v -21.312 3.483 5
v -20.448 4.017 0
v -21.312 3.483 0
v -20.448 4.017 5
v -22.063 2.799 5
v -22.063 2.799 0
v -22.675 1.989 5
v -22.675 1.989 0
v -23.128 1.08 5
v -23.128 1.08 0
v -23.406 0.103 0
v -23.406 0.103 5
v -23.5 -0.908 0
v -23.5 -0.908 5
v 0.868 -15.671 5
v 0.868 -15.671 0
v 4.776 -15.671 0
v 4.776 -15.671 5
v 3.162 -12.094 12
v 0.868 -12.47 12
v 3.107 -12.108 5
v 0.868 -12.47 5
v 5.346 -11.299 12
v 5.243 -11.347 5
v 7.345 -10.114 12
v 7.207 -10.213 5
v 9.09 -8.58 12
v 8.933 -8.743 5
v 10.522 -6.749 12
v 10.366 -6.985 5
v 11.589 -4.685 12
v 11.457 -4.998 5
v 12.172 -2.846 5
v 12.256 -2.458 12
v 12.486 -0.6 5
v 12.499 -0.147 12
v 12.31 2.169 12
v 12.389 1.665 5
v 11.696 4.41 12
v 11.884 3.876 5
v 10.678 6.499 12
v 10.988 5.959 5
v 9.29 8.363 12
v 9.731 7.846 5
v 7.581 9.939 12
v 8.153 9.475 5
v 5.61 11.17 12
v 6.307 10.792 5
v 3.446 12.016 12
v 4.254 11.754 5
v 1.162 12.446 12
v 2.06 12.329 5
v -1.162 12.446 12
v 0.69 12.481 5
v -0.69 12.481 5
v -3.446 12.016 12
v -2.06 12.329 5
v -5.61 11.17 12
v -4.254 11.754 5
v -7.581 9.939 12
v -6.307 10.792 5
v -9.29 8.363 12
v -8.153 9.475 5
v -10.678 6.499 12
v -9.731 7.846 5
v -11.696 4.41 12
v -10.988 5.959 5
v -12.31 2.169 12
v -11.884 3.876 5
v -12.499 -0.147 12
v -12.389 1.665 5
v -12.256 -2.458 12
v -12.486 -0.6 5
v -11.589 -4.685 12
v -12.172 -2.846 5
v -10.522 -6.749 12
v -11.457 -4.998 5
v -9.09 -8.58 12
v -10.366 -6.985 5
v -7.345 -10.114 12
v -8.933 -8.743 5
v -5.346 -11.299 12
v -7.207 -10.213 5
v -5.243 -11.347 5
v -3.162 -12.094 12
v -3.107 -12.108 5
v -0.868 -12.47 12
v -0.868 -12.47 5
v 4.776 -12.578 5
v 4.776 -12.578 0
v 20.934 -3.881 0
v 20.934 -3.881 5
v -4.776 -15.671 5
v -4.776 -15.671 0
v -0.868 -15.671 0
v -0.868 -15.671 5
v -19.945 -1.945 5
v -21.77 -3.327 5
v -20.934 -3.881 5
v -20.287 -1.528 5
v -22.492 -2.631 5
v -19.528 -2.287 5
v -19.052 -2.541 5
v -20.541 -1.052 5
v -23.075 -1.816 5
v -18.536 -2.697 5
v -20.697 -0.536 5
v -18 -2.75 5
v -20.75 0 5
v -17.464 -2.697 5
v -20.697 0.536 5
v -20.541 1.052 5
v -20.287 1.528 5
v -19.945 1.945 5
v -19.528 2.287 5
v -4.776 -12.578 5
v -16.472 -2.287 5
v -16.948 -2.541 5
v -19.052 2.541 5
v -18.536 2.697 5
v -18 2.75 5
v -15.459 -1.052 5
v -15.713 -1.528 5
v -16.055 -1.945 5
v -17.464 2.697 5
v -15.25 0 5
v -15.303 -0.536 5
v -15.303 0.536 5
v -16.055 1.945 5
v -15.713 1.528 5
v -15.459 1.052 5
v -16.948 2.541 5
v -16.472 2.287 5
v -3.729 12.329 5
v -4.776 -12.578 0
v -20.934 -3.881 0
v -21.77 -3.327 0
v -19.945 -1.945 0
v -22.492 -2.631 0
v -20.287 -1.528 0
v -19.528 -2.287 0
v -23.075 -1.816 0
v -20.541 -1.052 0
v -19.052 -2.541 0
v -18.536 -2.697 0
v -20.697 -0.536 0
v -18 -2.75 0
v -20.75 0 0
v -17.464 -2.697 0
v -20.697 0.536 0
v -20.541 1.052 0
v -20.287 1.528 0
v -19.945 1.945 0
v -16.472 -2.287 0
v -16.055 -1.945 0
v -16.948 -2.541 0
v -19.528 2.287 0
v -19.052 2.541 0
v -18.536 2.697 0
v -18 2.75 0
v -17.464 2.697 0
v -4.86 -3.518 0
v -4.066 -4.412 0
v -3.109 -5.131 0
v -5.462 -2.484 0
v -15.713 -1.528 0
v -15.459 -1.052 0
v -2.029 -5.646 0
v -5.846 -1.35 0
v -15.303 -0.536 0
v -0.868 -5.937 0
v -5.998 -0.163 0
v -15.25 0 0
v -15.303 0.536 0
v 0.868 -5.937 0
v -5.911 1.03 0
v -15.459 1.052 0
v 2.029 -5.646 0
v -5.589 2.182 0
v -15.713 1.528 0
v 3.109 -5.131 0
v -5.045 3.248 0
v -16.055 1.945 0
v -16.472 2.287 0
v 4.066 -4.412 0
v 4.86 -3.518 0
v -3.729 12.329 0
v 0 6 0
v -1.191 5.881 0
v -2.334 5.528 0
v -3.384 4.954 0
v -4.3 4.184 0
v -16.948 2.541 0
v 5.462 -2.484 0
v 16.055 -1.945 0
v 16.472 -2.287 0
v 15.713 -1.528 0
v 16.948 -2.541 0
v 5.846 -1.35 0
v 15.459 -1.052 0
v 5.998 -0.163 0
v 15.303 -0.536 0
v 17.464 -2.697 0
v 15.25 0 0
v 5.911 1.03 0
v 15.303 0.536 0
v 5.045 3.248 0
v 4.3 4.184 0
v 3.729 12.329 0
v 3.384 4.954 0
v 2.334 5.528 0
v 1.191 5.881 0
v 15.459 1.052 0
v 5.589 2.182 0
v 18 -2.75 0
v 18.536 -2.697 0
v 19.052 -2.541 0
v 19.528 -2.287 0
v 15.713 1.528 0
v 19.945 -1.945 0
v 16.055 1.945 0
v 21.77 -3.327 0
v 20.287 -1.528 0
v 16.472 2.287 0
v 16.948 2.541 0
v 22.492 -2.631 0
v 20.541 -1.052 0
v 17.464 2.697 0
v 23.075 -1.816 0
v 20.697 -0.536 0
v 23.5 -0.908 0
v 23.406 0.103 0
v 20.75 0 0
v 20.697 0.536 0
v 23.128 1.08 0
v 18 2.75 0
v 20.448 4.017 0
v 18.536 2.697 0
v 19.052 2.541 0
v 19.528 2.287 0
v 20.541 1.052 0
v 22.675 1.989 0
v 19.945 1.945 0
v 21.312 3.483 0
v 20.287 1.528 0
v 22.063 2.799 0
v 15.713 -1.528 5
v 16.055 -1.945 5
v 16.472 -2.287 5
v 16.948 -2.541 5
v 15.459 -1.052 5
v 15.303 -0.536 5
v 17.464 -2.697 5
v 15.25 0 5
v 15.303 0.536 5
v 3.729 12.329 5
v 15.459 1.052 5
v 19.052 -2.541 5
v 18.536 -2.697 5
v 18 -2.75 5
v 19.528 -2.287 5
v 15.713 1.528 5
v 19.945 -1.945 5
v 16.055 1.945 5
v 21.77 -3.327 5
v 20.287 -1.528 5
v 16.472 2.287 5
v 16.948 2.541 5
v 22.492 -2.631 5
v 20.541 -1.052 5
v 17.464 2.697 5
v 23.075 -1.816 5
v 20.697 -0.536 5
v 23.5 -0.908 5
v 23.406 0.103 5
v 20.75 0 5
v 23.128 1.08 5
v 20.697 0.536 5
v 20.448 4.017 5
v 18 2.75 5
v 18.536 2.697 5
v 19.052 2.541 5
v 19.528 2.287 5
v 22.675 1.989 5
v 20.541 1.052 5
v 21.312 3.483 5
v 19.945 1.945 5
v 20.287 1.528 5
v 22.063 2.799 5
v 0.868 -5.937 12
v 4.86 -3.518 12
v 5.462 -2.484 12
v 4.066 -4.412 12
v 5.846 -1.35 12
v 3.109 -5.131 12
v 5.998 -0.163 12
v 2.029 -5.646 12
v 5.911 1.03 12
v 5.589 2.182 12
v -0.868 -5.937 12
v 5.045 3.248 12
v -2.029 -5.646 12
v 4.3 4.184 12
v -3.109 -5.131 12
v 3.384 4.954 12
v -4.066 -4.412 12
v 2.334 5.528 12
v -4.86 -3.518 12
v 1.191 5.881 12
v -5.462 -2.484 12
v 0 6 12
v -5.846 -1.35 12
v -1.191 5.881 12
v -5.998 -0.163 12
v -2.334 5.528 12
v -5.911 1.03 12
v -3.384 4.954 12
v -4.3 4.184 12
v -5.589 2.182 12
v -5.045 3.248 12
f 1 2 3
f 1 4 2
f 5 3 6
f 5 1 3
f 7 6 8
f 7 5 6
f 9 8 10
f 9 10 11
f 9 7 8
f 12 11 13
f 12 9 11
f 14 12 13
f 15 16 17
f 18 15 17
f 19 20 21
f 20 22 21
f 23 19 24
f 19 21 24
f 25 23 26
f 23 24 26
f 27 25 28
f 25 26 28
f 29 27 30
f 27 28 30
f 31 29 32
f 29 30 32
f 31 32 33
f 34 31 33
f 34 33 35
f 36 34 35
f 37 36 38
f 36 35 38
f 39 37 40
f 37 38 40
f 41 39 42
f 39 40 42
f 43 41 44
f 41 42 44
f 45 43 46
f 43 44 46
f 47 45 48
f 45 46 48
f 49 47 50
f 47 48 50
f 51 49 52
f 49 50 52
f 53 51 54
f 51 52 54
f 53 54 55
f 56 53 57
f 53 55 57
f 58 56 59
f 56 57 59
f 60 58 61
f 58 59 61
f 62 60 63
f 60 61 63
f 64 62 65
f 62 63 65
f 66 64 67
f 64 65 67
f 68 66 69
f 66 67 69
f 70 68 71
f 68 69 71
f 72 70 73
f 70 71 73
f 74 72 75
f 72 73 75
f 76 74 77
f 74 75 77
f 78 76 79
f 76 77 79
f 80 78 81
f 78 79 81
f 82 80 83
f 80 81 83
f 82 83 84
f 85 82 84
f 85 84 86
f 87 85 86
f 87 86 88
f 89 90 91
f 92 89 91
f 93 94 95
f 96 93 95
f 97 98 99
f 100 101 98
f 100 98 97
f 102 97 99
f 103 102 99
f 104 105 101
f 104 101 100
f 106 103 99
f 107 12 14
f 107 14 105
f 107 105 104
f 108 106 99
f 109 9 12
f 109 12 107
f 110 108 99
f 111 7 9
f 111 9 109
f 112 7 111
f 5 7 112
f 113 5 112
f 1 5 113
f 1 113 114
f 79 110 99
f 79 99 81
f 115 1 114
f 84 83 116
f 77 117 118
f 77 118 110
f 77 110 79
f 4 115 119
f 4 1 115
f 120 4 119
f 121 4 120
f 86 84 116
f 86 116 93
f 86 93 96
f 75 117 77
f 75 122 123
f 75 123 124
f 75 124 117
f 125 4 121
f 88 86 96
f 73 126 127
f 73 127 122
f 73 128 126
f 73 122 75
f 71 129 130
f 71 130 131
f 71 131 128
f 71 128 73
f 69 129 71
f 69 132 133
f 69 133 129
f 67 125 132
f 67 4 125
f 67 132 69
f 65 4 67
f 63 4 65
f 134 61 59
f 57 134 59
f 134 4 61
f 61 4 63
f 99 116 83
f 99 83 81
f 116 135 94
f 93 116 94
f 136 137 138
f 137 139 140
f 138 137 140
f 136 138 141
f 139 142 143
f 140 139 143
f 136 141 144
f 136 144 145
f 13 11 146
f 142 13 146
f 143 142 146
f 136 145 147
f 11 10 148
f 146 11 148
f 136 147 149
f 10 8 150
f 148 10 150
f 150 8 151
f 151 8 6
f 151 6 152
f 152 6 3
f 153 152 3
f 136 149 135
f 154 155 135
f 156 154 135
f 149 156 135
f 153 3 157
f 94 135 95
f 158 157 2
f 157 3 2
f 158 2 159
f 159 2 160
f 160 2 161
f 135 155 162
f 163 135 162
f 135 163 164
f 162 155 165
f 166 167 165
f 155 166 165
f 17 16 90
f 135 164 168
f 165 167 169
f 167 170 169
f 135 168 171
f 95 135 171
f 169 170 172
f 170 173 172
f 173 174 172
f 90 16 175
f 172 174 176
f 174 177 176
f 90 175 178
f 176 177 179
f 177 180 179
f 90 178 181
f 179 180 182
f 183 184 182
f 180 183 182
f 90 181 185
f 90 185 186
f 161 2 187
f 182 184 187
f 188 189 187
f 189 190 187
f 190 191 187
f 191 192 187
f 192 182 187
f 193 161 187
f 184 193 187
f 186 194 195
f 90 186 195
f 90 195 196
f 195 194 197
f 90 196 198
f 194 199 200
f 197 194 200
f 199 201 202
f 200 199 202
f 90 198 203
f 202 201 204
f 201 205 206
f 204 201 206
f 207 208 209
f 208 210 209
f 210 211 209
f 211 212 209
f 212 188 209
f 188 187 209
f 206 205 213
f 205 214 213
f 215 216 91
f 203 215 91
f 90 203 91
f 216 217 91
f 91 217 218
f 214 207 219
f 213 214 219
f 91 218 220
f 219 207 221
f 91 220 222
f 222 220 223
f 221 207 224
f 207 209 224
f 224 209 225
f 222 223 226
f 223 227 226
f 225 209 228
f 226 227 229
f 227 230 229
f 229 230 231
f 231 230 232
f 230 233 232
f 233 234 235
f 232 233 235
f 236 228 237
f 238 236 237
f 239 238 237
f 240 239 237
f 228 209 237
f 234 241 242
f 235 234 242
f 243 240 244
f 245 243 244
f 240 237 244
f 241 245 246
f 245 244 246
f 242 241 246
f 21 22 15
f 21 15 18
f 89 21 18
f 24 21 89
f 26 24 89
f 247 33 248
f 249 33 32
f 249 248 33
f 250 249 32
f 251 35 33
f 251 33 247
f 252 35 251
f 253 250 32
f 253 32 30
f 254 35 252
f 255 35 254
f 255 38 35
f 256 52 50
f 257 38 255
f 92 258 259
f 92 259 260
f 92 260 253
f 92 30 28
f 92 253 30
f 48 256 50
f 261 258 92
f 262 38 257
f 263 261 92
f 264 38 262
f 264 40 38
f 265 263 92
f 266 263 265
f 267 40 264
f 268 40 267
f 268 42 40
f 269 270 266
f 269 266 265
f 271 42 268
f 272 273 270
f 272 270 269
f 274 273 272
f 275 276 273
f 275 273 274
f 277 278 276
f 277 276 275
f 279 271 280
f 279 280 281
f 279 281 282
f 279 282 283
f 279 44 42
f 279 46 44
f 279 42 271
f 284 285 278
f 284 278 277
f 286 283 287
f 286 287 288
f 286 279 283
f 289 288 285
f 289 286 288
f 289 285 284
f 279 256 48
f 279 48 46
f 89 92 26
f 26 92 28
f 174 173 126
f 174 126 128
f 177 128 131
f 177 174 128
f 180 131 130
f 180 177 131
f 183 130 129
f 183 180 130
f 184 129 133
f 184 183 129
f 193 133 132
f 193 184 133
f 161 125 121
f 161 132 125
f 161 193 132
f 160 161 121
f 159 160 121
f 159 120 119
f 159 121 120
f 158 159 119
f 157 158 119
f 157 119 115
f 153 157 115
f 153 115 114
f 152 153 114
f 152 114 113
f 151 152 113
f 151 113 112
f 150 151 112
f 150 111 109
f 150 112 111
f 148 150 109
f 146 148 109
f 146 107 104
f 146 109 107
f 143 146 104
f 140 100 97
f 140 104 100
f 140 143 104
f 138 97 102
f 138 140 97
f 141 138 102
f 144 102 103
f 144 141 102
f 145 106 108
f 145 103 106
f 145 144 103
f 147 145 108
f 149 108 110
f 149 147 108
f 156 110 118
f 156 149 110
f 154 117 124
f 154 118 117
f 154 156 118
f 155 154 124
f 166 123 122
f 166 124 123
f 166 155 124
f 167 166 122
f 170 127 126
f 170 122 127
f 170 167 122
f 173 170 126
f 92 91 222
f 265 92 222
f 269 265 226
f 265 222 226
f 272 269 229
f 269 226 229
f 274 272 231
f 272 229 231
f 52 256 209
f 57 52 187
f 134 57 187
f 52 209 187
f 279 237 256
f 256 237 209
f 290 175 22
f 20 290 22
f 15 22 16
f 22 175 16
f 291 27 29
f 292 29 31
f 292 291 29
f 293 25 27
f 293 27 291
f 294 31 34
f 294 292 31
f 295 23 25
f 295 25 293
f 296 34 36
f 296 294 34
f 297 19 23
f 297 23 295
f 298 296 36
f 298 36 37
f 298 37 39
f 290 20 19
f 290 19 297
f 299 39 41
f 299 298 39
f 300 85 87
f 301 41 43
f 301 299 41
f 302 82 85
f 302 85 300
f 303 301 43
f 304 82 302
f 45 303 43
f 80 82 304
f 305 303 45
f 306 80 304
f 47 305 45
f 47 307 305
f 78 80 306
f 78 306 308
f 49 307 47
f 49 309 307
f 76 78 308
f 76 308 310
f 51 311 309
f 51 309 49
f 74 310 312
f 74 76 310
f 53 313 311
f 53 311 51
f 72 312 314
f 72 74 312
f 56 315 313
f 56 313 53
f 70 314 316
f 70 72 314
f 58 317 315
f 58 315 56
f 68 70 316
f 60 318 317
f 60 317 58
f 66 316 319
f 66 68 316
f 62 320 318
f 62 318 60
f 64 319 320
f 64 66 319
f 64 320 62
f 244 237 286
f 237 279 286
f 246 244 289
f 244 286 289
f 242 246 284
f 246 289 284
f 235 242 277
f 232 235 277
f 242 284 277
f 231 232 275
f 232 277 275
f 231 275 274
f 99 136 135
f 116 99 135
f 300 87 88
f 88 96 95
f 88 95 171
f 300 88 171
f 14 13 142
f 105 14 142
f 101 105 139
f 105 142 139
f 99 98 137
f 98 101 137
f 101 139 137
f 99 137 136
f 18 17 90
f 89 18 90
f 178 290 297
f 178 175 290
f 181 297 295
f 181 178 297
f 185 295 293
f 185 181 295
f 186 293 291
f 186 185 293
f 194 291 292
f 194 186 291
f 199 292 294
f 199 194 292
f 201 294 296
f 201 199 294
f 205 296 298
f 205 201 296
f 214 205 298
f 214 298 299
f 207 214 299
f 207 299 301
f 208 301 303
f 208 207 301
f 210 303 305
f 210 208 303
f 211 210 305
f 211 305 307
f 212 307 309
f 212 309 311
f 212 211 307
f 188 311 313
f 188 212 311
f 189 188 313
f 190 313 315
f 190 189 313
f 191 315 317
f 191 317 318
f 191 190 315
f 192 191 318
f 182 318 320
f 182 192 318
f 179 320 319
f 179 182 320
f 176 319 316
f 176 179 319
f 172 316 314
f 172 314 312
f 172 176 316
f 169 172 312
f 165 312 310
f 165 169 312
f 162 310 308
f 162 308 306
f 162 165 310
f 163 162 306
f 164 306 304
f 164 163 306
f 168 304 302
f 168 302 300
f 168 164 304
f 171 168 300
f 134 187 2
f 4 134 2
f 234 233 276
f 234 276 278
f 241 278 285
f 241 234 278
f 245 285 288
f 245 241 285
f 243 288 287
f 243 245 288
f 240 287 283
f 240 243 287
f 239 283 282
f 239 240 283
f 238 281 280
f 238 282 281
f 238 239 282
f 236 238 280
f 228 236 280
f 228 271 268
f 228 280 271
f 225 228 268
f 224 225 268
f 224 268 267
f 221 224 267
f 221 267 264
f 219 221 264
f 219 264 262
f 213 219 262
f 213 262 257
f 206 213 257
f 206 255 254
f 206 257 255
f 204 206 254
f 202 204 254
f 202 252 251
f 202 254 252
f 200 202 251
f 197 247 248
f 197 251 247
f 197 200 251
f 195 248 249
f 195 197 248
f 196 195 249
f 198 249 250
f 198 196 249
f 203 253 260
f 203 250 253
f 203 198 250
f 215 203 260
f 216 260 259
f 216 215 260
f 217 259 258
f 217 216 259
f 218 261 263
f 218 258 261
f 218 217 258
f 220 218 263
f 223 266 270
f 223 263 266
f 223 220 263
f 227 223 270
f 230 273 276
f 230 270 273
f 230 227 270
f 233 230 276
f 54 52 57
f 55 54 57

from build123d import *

# Parameters (mm, degrees)
RESSALTO_EXTRUS_O1_DEPTH   = 5
ESBO_O3_R                  = 12.5
RESSALTO_EXTRUS_O2_DEPTH   = 7
CORTE_EXTRUS_O1_DEPTH      = 30.100324457
CORTE_EXTRUS_O1_DEPTH_BACK = 30.100324457
ESBO_O2_R                  = 6
ESBO_O2_R_2                = 2.75
FILETE8_R                  = 5.5
FILETE9_R                  = 5.5
FILETE10_R                 = 5.5
FILETE11_R                 = 5.5
CORTE_EXTRUS_O2_DEPTH      = 31.689230742
CORTE_EXTRUS_O2_DEPTH_BACK = 31.689230742
ESBO_O4_W                  = 1.736979024
ESBO_O4_H                  = 15.670956688


with BuildPart() as part:
    # Ressalto-extrusão1: read off the stored shape, not the designer's step
    # Ressalto-extrusão1 outline → Ressalto-extrusão1 (new body)
    with BuildSketch(Plane.XY):
        Polygon((4.775767162, -12.578134648), (23.5, -2.5), (23.5, 2.5), (3.728917801, 12.329043312), (-3.728917801, 12.329043312), (-23.5, 2.5), (-23.5, -2.5), (-4.775767162, -12.578134648), (-4.775767162, -15.670956688), (-0.868489512, -15.670956688), (-0.868489512, 0), (0.868489512, 0), (0.868489512, -15.670956688), (4.775767162, -15.670956688), align=None)
    extrude(amount=RESSALTO_EXTRUS_O1_DEPTH)

    # Esboço3 → Ressalto-extrusão2 (add)
    with BuildSketch(Plane.XY.offset(5)):
        with Locations(Location((0, 0, 0), (0, 0, 99.486846806))):
            Circle(ESBO_O3_R)
    extrude(amount=RESSALTO_EXTRUS_O2_DEPTH)

    # Esboço2 → Corte-extrusão1 (cut, two sides: drawn at the far end of the back side and taken through both)
    with BuildSketch(Plane.XY.offset(5).offset(-CORTE_EXTRUS_O1_DEPTH_BACK)):
        Circle(ESBO_O2_R)
        with Locations((-18, 0)):
            Circle(ESBO_O2_R_2)
        with Locations((18, 0)):
            Circle(ESBO_O2_R_2)
    extrude(amount=CORTE_EXTRUS_O1_DEPTH + CORTE_EXTRUS_O1_DEPTH_BACK, mode=Mode.SUBTRACT)

    # Filete8
    filete8_edges = [part.edges().sort_by_distance(p)[0] for p in [
        (-23.5, 2.5, 2.5),
    ]]
    fillet(filete8_edges, radius=FILETE8_R)

    # Filete9
    # the kernel refuses this fillet: 5.5 mm, written as the material it takes off along each edge
    with BuildSketch(Plane(origin=(-23.5, -2.5, -7.284114841), x_dir=(1.1558918030709584e-12, 1.0, 0), z_dir=(0, 0, 1))) as filete9_piece_1:
        with BuildLine():
            CenterArc((3.462119709, -5.172336006), FILETE9_R, 109.876993247, 41.832083594)
            Line((-1.380918754, -2.565618062), (-1.477779523, -2.513483703))
            Line((-1.477779523, -2.513483703), (-0.096860769, 0.052134359))
            Line((-0.096860769, 0.052134359), (0, 0.11))
            ThreePointArc((0, 0.11), (0.796054475, 0.11), (1.554708735, 0.10344672))
            Line((1.554708735, 0.10344672), (1.592108951, 0))
        make_face()
    extrude(amount=19.568229683, mode=Mode.SUBTRACT)

    # Filete10
    filete10_edges = [part.edges().sort_by_distance(p)[0] for p in [
        (23.5, 2.5, 2.5),
    ]]
    fillet(filete10_edges, radius=FILETE10_R)

    # Filete11
    # the kernel refuses this fillet: 5.5 mm, written as the material it takes off along each edge
    with BuildSketch(Plane(origin=(23.5, -2.5, -7.284114841), x_dir=(-1.1603547057855156e-12, 1.0, 0), z_dir=(0, 0, 1))) as filete11_piece_1:
        with BuildLine():
            CenterArc((3.462119709, 5.172336006), FILETE11_R, 208.290923159, 41.832083594)
            Line((-1.380918754, 2.565618062), (-1.477779523, 2.513483703))
            Line((-1.477779523, 2.513483703), (-0.096860769, -0.052134359))
            Line((-0.096860769, -0.052134359), (0, -0.11))
            ThreePointArc((0, -0.11), (0.796054475, -0.11), (1.554708735, -0.10344672))
            Line((1.554708735, -0.10344672), (1.592108951, 0))
        make_face()
    extrude(amount=19.568229683, mode=Mode.SUBTRACT)

    # Esboço4 → Corte-extrusão2 (cut, two sides: drawn at the far end of the back side and taken through both)
    with BuildSketch(Plane.XY.offset(12).offset(-CORTE_EXTRUS_O2_DEPTH_BACK)):
        with Locations((0, -7.835478344)):
            Rectangle(ESBO_O4_W, ESBO_O4_H)
    extrude(amount=CORTE_EXTRUS_O2_DEPTH + CORTE_EXTRUS_O2_DEPTH_BACK, mode=Mode.SUBTRACT)


solid = part.part
